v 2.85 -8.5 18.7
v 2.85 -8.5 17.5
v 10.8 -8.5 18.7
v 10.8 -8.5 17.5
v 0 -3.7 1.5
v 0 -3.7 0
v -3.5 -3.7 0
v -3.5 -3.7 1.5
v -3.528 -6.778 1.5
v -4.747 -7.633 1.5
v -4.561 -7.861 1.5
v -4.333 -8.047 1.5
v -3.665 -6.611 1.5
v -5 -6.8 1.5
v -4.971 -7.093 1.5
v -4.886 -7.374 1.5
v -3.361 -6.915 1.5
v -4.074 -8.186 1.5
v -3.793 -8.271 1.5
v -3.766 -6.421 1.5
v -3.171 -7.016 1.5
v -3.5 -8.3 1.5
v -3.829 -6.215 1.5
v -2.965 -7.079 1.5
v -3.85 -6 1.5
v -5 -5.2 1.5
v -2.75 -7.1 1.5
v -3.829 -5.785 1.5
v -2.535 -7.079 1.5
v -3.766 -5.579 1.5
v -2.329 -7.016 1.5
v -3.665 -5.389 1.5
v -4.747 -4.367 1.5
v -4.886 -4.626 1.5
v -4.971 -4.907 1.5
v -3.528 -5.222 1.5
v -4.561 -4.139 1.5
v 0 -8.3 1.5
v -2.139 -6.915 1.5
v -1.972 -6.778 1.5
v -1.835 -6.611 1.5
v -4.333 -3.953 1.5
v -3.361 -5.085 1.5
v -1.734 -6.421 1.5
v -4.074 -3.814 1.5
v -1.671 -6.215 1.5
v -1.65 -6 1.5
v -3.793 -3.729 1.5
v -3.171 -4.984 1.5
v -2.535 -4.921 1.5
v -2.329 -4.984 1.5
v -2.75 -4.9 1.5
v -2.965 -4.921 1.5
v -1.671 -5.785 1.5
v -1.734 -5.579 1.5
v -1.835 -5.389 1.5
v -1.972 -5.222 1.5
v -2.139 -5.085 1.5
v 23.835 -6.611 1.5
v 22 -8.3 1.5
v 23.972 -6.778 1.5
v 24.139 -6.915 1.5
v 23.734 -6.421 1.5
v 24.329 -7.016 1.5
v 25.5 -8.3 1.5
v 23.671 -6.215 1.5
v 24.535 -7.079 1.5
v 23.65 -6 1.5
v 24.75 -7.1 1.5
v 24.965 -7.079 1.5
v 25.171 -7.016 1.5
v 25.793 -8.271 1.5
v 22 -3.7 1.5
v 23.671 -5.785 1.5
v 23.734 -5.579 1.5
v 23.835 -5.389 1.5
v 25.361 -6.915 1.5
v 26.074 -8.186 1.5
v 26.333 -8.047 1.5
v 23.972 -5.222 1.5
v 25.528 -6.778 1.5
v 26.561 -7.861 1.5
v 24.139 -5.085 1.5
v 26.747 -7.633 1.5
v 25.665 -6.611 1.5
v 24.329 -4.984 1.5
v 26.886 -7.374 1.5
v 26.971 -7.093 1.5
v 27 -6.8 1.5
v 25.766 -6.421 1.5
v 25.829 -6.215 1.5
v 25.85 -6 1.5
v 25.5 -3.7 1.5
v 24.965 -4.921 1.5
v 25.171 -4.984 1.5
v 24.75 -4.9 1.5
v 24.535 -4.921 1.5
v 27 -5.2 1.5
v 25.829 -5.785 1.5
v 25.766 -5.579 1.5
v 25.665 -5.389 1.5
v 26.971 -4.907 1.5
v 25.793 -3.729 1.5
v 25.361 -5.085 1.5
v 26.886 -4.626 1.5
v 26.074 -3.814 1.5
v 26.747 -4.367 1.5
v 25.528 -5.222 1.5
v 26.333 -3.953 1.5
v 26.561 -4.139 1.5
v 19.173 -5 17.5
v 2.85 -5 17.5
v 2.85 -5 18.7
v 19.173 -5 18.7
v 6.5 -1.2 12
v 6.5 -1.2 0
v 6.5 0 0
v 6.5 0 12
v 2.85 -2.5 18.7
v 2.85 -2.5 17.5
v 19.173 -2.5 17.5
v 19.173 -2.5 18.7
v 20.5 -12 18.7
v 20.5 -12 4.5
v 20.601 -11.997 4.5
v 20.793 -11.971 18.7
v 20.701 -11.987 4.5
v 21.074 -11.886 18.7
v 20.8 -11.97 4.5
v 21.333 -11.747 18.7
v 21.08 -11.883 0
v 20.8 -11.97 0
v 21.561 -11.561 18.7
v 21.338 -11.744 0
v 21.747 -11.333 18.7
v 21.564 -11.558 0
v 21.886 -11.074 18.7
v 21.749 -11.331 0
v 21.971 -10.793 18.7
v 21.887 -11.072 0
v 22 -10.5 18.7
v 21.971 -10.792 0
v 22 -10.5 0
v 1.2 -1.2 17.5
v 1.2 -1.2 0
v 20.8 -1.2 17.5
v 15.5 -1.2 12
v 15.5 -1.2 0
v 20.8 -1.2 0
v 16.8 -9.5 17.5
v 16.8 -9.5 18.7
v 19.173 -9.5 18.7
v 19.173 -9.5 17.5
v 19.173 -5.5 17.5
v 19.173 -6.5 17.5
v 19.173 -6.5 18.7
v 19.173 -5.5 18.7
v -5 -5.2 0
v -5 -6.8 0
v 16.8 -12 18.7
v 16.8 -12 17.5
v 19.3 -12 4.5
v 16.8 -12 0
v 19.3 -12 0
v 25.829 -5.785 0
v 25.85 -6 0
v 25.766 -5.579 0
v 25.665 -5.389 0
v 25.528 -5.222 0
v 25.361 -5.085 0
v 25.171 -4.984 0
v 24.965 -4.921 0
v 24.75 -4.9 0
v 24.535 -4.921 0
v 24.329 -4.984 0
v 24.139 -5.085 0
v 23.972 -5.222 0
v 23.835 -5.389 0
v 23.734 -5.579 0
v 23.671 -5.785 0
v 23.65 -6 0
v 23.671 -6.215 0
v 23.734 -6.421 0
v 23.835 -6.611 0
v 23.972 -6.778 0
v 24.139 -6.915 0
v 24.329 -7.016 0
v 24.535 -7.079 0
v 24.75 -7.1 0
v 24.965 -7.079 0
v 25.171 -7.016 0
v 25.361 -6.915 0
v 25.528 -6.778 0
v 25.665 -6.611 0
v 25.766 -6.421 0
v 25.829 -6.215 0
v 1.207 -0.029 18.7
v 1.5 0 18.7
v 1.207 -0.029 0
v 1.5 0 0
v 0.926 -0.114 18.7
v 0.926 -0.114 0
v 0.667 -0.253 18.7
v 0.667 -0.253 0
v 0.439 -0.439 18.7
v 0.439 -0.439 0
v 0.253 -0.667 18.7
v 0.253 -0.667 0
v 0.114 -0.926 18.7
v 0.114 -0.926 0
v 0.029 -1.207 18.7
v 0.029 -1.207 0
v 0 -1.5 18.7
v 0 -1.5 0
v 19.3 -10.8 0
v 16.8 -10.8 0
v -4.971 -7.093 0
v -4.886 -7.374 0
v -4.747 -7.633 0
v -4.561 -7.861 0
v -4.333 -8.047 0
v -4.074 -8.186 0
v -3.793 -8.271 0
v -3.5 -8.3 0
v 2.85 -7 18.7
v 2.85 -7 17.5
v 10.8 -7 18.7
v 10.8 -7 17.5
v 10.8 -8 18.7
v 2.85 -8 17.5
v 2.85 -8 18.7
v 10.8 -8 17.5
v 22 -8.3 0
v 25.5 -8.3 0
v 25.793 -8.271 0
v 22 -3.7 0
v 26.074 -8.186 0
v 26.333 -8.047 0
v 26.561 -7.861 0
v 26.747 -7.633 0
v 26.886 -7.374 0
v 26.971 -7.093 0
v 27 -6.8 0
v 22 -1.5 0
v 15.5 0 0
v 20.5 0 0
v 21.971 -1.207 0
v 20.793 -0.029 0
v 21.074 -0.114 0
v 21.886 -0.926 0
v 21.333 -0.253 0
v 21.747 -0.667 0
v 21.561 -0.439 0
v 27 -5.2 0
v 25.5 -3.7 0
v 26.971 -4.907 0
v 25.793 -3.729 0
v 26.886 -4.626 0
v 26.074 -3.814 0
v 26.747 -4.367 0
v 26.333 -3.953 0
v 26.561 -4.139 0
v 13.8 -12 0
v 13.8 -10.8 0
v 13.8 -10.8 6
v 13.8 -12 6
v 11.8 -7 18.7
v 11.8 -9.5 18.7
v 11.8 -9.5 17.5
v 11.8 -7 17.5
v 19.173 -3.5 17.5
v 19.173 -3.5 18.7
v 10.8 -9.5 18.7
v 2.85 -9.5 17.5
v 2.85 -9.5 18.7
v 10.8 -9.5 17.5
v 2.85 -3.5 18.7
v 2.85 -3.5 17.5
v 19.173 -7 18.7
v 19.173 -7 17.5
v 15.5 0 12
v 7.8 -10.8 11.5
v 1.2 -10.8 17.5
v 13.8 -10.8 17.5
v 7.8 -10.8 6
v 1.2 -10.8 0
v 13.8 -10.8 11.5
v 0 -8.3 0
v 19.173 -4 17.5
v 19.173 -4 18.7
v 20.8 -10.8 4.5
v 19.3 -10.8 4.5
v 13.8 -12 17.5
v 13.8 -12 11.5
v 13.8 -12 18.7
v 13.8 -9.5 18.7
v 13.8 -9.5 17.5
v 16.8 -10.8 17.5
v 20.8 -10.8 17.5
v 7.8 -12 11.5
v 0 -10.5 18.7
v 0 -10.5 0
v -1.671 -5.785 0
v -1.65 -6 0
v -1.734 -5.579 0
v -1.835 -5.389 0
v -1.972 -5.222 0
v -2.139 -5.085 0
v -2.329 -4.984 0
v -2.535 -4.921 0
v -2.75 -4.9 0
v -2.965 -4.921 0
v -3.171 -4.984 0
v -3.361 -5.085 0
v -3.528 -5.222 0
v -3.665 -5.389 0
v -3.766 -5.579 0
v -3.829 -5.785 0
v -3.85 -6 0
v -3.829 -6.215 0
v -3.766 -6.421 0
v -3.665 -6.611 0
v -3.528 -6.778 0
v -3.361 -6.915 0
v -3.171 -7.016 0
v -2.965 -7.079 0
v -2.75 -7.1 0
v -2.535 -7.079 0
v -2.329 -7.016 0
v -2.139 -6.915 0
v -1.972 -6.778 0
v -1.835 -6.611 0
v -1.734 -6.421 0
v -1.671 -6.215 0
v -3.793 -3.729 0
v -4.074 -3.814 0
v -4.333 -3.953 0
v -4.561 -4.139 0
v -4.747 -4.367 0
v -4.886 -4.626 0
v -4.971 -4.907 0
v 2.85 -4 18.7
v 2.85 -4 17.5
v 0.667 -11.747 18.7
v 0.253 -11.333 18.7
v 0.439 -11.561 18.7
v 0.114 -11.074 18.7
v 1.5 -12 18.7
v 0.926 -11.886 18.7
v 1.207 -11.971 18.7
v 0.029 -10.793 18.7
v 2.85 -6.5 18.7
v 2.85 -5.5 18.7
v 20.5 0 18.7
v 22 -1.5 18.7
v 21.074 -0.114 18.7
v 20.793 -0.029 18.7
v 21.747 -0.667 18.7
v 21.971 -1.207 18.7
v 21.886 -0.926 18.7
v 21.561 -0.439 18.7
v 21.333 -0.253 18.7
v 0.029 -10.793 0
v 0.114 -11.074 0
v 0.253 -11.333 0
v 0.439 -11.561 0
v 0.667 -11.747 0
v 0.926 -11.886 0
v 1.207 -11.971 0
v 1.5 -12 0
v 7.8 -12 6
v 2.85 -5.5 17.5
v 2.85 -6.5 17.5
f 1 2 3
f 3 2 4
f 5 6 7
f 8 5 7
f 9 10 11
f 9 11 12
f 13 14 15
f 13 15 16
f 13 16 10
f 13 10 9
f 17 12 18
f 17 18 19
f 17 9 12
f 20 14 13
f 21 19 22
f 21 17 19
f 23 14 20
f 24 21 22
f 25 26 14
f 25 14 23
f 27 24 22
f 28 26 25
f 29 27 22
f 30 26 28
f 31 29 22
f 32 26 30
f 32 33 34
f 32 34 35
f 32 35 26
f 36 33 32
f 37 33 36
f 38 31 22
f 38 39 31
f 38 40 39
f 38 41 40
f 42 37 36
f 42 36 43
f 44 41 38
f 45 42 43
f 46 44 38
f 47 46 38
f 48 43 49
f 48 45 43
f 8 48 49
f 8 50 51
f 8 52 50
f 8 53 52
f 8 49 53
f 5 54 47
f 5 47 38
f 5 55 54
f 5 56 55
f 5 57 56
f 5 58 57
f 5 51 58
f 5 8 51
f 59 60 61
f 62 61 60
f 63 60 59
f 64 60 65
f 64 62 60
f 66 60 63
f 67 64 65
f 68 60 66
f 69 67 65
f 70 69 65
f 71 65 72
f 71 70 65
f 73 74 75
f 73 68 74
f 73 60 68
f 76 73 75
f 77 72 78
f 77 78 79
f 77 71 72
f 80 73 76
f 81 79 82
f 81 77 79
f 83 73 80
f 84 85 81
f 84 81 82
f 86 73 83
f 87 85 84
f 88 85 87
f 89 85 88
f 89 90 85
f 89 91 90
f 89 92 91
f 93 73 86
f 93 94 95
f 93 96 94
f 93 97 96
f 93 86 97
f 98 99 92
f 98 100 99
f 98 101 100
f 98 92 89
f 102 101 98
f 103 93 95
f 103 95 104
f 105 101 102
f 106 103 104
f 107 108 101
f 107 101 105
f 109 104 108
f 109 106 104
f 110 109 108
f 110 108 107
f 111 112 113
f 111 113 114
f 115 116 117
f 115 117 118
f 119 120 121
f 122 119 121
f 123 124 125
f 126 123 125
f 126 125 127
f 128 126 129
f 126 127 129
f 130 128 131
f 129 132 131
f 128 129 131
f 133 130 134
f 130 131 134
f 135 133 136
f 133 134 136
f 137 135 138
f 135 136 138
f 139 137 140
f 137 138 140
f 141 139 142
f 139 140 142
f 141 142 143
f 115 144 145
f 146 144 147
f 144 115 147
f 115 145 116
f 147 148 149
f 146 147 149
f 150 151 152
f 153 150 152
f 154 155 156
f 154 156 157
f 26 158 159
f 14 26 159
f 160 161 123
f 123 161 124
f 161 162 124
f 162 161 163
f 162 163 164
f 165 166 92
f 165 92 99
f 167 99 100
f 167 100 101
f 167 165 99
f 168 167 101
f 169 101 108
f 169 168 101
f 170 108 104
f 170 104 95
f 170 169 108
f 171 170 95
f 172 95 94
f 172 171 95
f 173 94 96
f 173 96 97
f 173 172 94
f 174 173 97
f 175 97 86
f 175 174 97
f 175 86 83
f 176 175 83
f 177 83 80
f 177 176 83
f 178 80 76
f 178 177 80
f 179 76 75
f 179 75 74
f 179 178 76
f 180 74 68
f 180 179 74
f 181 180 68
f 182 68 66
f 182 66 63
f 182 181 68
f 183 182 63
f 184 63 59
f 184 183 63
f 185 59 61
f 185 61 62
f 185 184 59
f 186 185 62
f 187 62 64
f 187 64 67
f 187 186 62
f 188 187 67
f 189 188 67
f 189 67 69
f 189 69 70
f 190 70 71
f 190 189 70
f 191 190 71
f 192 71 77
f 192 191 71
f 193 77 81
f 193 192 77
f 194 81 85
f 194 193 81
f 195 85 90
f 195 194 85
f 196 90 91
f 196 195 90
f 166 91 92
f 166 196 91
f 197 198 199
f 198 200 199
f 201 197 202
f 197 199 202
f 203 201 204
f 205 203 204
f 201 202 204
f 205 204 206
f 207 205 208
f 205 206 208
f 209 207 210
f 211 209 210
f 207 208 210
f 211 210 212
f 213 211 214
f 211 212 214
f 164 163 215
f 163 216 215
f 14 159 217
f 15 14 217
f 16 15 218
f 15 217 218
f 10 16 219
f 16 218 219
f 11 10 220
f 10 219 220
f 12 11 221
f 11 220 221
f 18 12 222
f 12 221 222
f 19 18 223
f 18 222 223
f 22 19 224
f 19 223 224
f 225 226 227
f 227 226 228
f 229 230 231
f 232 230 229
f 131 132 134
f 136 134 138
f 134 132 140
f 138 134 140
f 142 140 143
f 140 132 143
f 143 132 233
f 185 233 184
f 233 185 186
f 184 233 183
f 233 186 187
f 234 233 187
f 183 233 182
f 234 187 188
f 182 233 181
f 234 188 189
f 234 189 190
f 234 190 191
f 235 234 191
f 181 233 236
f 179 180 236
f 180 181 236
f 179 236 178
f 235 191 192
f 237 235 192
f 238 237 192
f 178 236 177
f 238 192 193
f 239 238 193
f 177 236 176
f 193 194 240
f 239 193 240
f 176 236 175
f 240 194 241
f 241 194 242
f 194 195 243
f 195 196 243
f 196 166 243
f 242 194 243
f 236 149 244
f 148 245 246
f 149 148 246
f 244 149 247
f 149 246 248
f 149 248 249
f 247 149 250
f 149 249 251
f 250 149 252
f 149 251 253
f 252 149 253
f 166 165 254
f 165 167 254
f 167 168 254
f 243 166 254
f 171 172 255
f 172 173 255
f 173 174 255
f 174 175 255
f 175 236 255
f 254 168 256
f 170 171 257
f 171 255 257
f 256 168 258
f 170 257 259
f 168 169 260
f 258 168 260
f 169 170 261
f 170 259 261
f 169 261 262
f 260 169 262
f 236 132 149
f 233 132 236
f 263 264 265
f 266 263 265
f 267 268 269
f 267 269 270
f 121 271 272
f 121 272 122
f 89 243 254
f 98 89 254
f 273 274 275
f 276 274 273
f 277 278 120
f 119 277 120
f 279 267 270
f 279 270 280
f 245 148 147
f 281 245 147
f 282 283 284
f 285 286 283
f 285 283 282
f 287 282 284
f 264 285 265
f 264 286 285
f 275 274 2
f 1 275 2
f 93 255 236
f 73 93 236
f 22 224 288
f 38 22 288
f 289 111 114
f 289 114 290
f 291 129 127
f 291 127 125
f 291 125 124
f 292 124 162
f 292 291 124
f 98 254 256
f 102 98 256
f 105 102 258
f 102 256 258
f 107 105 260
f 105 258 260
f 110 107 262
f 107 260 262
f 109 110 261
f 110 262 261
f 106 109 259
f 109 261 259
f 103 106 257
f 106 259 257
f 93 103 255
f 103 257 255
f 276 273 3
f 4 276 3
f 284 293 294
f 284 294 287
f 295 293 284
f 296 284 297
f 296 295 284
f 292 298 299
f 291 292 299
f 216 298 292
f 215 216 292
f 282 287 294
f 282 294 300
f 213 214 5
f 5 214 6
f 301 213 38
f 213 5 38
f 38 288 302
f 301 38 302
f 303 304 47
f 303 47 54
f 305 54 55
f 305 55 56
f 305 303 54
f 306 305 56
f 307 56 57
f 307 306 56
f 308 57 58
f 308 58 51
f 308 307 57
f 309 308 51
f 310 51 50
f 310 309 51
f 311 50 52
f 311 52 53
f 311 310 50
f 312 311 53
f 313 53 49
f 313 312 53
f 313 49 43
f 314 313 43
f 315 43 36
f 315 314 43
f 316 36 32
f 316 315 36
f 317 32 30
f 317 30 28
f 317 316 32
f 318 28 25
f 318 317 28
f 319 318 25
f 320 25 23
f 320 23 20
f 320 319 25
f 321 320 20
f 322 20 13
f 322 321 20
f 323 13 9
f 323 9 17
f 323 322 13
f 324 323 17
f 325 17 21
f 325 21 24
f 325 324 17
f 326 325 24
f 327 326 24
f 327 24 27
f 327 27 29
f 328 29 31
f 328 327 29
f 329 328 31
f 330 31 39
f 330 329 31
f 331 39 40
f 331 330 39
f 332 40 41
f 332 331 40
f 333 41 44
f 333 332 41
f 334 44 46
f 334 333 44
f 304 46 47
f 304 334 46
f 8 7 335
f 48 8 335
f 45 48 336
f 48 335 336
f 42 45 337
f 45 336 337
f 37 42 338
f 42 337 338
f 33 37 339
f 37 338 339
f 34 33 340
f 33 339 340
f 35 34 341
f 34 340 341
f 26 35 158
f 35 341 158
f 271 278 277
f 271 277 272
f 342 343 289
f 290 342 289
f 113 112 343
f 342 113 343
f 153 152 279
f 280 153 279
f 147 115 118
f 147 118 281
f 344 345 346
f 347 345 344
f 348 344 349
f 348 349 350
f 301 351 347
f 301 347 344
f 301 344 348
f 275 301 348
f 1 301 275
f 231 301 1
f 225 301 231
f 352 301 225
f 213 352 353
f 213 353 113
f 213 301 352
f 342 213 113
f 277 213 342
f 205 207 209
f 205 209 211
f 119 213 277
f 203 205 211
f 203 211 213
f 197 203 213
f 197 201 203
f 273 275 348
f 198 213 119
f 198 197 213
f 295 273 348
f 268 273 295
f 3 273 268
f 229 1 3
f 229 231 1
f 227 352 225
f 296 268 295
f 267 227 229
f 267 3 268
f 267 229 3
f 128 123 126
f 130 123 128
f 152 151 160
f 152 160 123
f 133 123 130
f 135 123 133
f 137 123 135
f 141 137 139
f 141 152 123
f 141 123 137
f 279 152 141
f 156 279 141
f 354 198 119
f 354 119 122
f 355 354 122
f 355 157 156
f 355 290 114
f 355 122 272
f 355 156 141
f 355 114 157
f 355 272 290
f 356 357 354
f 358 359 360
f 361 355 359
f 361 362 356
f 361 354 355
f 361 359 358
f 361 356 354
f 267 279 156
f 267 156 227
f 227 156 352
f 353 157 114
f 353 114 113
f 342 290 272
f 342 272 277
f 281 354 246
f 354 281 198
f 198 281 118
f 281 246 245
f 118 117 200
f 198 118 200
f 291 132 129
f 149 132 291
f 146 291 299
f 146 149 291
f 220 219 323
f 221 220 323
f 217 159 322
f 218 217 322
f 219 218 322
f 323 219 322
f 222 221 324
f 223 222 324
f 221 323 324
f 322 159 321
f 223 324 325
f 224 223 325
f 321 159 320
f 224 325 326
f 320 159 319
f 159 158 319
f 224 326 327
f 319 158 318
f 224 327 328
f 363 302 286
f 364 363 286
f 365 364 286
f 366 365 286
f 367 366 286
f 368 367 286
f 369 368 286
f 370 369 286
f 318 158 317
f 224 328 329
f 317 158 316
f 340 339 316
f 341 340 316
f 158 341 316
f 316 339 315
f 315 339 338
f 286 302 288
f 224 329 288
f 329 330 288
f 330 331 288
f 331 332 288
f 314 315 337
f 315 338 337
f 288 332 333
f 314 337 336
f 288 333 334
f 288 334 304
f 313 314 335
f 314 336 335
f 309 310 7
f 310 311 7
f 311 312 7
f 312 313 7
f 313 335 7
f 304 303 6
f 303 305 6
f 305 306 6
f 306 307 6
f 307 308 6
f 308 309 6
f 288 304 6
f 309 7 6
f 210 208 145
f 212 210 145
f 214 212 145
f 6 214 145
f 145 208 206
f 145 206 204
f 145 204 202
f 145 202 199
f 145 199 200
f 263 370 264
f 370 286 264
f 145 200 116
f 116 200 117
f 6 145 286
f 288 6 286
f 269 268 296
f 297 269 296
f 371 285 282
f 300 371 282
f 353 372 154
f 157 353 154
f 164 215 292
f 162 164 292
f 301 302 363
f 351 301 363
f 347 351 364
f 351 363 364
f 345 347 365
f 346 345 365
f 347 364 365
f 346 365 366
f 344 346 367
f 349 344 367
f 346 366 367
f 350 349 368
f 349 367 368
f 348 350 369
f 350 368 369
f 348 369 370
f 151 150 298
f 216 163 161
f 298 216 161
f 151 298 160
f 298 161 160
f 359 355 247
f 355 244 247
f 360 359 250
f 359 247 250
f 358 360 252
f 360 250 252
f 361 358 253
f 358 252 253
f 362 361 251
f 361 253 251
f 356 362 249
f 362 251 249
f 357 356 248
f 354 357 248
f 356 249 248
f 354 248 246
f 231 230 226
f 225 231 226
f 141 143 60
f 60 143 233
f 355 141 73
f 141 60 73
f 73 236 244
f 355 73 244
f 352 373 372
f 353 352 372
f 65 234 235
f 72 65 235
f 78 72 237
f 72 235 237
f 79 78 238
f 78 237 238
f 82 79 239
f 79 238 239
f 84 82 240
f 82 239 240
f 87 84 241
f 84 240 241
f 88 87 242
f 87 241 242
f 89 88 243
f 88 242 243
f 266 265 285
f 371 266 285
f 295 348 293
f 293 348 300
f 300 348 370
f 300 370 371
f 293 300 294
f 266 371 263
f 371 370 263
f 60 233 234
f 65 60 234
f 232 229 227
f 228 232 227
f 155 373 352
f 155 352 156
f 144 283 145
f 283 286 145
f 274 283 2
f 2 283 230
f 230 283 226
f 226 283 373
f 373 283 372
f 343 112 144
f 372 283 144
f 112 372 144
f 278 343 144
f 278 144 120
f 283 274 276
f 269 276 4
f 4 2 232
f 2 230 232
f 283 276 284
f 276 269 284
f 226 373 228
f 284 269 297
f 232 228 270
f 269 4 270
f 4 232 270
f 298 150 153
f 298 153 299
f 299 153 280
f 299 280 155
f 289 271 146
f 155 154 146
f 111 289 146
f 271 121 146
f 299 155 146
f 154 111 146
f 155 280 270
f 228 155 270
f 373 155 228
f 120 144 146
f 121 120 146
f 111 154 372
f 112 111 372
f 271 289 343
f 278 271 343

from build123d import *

# Parameters (mm, degrees)
F0_R      = 1.1
F1_DEPTH  = 1.5
F2_W      = 19.6000001132
F2_H      = 9.6000001132
F3_DEPTH  = 16
F4_W      = 1.5
F4_H      = 4.5
F4_W_2    = 6
F4_H_2    = 5.5
F5_DEPTH  = 1.2
F6_W      = 9
F6_H      = 12
F7_DEPTH  = 25
F8_W      = 16.3223941345
F8_H      = 1
F9_DEPTH  = 1.2
F10_W     = 3
F10_H     = 1.2
F11_DEPTH = 4
F12_W     = 3
F12_H     = 1
F12_W_2   = 2.3728397638
F13_DEPTH = 1.2
F14_W     = 2
F14_H     = 2.5
F14_W_2   = 2.3728397638
F15_DEPTH = 1.2


# Not quite as in the source:
# - a feature names something its author has since deleted; it is built from what else it names


with BuildPart() as f1:
    # F0 (on Top) → F1 (new body)
    with BuildSketch(Plane.XY):
        with BuildLine():
            Line((20.5, 0), (1.5, 0))
            ThreePointArc((1.5, 0), (0.4393398282, -0.4393398282), (0, -1.5))
            Line((0, -1.5), (0, -3.7))
            Line((0, -3.7), (0, -8.3))
            Line((0, -8.3), (0, -10.5))
            ThreePointArc((0, -10.5), (0.4393398282, -11.5606601718), (1.5, -12))
            Line((1.5, -12), (20.5, -12))
            ThreePointArc((20.5, -12), (21.5606601718, -11.5606601718), (22, -10.5))
            Line((22, -10.5), (22, -8.3))
            Line((22, -8.3), (22, -3.7))
            Line((22, -3.7), (22, -1.5))
            ThreePointArc((22, -1.5), (21.5606601718, -0.4393398282), (20.5, 0))
        make_face()
        Polygon((20.8000000566, -1.1999999434), (20.8000000566, -1.5), (20.8000000566, -10.5), (20.8000000566, -10.8000000566), (20.5, -10.8000000566), (1.5, -10.8000000566), (1.1999999434, -10.8000000566), (1.1999999434, -10.5), (1.1999999434, -1.5), (1.1999999434, -1.1999999434), (1.5, -1.1999999434), (20.5, -1.1999999434), align=None, mode=Mode.SUBTRACT)
        with BuildLine():
            Line((0, -8.3), (0, -3.7))
            Line((0, -3.7), (-3.5, -3.7))
            ThreePointArc((-3.5, -3.7), (-4.5606601718, -4.1393398282), (-5, -5.2))
            Line((-5, -5.2), (-5, -6.8))
            ThreePointArc((-5, -6.8), (-4.5606601718, -7.8606601718), (-3.5, -8.3))
            Line((-3.5, -8.3), (0, -8.3))
        make_face()
        with Locations((-2.75, -6)):
            Circle(F0_R, mode=Mode.SUBTRACT)
        with BuildLine():
            Line((25.5, -3.7), (22, -3.7))
            Line((22, -3.7), (22, -8.3))
            Line((22, -8.3), (25.5, -8.3))
            ThreePointArc((25.5, -8.3), (26.5606601718, -7.8606601718), (27, -6.8))
            Line((27, -6.8), (27, -5.2))
            ThreePointArc((27, -5.2), (26.5606601718, -4.1393398282), (25.5, -3.7))
        make_face()
        with Locations((24.75, -6)):
            Circle(F0_R, mode=Mode.SUBTRACT)
    extrude(amount=F1_DEPTH)

    # F2 (on face) → F3 (join)
    with BuildSketch(Plane.XY.offset(1.5)):
        with BuildLine():
            Line((22, -10.5), (22, -8.3))
            Line((22, -8.3), (22, -3.7))
            Line((22, -3.7), (22, -1.5))
            ThreePointArc((22, -1.5), (21.5606601718, -0.4393398282), (20.5, 0))
            Line((20.5, 0), (1.5, 0))
            ThreePointArc((1.5, 0), (0.4393398282, -0.4393398282), (0, -1.5))
            Line((0, -1.5), (0, -3.7))
            Line((0, -3.7), (0, -8.3))
            Line((0, -8.3), (0, -10.5))
            ThreePointArc((0, -10.5), (0.4393398282, -11.5606601718), (1.5, -12))
            Line((1.5, -12), (20.5, -12))
            ThreePointArc((20.5, -12), (21.5606601718, -11.5606601718), (22, -10.5))
        make_face()
        with Locations((11, -6)):
            Rectangle(F2_W, F2_H, mode=Mode.SUBTRACT)
    extrude(amount=F3_DEPTH)

    # F4 (on face) → F5 (cut)
    with BuildSketch(Plane(origin=(0, -10.8000000566, 0), x_dir=(-1, 0, 0), z_dir=(0, 1, 0))):
        with Locations((-20.0500000566, 2.25)):
            Rectangle(F4_W, F4_H)
        Polygon((-16.8000000566, 17.5), (-16.8000000566, 0), (-13.8000000566, 0), (-13.8000000566, 6), (-13.8000000566, 11.5), (-13.8000000566, 17.5), align=None)
        with Locations((-10.8000000566, 8.75)):
            Rectangle(F4_W_2, F4_H_2)
    extrude(amount=-F5_DEPTH, mode=Mode.SUBTRACT)

    # F6 (on face) → F7 (cut)
    with BuildSketch(Plane.XZ.offset(1.1999999434)):
        with Locations((10.9999999434, 6)):
            Rectangle(F6_W, F6_H)
    extrude(amount=-F7_DEPTH, mode=Mode.SUBTRACT)

    # F8 (on face) → F9 (join)
    with BuildSketch(Plane.XY.offset(17.5)):
        with BuildLine():
            Line((16.8000000566, -10.8000000566), (16.8000000566, -12.0000000566))
            Line((16.8000000566, -12), (20.5, -12))
            ThreePointArc((20.5, -12), (21.5606601718, -11.5606601718), (22, -10.5))
            Line((22, -10.5), (22, -1.5))
            ThreePointArc((22, -1.5), (21.5606601718, -0.4393398282), (20.5, 0))
            Line((20.5, 0), (1.5, 0))
            ThreePointArc((1.5, 0), (0.4393398282, -0.4393398282), (0, -1.5))
            Line((0, -1.5), (0, -10.5))
            ThreePointArc((0, -10.5), (0.4393398282, -11.5606601718), (1.5, -12))
            Line((1.5, -12), (13.8000000566, -12))
            Line((13.8000000566, -12.0000000566), (13.8000000566, -10.8000000566))
            Line((13.8000000566, -10.8000000566), (1.1999999434, -10.8000000566))
            Line((1.1999999434, -10.8000000566), (1.1999999434, -1.1999999434))
            Line((1.1999999434, -1.1999999434), (20.8000000566, -1.1999999434))
            Line((20.8000000566, -1.1999999434), (20.8000000566, -10.8000000566))
            Line((20.8000000566, -10.8000000566), (16.8000000566, -10.8000000566))
        make_face()
        Polygon((13.8000000566, -12), (16.8000000566, -12), (16.8000000566, -10.8000000566), (20.8000000566, -10.8000000566), (20.8000000566, -1.1999999434), (1.1999999434, -1.1999999434), (1.1999999434, -10.8000000566), (13.8000000566, -10.8000000566), align=None)
        with Locations((11.0116427531, -9)):
            Rectangle(F8_W, F8_H, mode=Mode.SUBTRACT)
        with Locations((11.0116427531, -7.5)):
            Rectangle(F8_W, F8_H, mode=Mode.SUBTRACT)
        with Locations((11.0116427531, -6)):
            Rectangle(F8_W, F8_H, mode=Mode.SUBTRACT)
        with Locations((11.0116427531, -4.5)):
            Rectangle(F8_W, F8_H, mode=Mode.SUBTRACT)
        with Locations((11.0116427531, -3)):
            Rectangle(F8_W, F8_H, mode=Mode.SUBTRACT)
    extrude(amount=F9_DEPTH)

    # F10 (on face) → F11 (cut)
    with BuildSketch(Plane.XZ.offset(12)):
        with Locations((15.3000000566, 18.1)):
            Rectangle(F10_W, F10_H)
    extrude(amount=-F11_DEPTH, mode=Mode.SUBTRACT)

    # F12 (on face) → F13 (join)
    with BuildSketch(Plane.XY.offset(18.7)):
        with Locations((12.3000000566, -9)):
            Rectangle(F12_W, F12_H)
        with Locations((12.3000000566, -7.5)):
            Rectangle(F12_W, F12_H)
        with Locations((17.9864199385, -7.5)):
            Rectangle(F12_W_2, F12_H)
        with Locations((17.9864199385, -9)):
            Rectangle(F12_W_2, F12_H)
    extrude(amount=-F13_DEPTH)

    # F14 (on face) → F15 (cut)
    with BuildSketch(Plane.XY.offset(18.7)):
        with Locations((12.8000000566, -8.25)):
            Rectangle(F14_W, F14_H)
        with Locations((17.9864199385, -8.25)):
            Rectangle(F14_W_2, F14_H)
    extrude(amount=-F15_DEPTH, mode=Mode.SUBTRACT)


solid = f1.part
